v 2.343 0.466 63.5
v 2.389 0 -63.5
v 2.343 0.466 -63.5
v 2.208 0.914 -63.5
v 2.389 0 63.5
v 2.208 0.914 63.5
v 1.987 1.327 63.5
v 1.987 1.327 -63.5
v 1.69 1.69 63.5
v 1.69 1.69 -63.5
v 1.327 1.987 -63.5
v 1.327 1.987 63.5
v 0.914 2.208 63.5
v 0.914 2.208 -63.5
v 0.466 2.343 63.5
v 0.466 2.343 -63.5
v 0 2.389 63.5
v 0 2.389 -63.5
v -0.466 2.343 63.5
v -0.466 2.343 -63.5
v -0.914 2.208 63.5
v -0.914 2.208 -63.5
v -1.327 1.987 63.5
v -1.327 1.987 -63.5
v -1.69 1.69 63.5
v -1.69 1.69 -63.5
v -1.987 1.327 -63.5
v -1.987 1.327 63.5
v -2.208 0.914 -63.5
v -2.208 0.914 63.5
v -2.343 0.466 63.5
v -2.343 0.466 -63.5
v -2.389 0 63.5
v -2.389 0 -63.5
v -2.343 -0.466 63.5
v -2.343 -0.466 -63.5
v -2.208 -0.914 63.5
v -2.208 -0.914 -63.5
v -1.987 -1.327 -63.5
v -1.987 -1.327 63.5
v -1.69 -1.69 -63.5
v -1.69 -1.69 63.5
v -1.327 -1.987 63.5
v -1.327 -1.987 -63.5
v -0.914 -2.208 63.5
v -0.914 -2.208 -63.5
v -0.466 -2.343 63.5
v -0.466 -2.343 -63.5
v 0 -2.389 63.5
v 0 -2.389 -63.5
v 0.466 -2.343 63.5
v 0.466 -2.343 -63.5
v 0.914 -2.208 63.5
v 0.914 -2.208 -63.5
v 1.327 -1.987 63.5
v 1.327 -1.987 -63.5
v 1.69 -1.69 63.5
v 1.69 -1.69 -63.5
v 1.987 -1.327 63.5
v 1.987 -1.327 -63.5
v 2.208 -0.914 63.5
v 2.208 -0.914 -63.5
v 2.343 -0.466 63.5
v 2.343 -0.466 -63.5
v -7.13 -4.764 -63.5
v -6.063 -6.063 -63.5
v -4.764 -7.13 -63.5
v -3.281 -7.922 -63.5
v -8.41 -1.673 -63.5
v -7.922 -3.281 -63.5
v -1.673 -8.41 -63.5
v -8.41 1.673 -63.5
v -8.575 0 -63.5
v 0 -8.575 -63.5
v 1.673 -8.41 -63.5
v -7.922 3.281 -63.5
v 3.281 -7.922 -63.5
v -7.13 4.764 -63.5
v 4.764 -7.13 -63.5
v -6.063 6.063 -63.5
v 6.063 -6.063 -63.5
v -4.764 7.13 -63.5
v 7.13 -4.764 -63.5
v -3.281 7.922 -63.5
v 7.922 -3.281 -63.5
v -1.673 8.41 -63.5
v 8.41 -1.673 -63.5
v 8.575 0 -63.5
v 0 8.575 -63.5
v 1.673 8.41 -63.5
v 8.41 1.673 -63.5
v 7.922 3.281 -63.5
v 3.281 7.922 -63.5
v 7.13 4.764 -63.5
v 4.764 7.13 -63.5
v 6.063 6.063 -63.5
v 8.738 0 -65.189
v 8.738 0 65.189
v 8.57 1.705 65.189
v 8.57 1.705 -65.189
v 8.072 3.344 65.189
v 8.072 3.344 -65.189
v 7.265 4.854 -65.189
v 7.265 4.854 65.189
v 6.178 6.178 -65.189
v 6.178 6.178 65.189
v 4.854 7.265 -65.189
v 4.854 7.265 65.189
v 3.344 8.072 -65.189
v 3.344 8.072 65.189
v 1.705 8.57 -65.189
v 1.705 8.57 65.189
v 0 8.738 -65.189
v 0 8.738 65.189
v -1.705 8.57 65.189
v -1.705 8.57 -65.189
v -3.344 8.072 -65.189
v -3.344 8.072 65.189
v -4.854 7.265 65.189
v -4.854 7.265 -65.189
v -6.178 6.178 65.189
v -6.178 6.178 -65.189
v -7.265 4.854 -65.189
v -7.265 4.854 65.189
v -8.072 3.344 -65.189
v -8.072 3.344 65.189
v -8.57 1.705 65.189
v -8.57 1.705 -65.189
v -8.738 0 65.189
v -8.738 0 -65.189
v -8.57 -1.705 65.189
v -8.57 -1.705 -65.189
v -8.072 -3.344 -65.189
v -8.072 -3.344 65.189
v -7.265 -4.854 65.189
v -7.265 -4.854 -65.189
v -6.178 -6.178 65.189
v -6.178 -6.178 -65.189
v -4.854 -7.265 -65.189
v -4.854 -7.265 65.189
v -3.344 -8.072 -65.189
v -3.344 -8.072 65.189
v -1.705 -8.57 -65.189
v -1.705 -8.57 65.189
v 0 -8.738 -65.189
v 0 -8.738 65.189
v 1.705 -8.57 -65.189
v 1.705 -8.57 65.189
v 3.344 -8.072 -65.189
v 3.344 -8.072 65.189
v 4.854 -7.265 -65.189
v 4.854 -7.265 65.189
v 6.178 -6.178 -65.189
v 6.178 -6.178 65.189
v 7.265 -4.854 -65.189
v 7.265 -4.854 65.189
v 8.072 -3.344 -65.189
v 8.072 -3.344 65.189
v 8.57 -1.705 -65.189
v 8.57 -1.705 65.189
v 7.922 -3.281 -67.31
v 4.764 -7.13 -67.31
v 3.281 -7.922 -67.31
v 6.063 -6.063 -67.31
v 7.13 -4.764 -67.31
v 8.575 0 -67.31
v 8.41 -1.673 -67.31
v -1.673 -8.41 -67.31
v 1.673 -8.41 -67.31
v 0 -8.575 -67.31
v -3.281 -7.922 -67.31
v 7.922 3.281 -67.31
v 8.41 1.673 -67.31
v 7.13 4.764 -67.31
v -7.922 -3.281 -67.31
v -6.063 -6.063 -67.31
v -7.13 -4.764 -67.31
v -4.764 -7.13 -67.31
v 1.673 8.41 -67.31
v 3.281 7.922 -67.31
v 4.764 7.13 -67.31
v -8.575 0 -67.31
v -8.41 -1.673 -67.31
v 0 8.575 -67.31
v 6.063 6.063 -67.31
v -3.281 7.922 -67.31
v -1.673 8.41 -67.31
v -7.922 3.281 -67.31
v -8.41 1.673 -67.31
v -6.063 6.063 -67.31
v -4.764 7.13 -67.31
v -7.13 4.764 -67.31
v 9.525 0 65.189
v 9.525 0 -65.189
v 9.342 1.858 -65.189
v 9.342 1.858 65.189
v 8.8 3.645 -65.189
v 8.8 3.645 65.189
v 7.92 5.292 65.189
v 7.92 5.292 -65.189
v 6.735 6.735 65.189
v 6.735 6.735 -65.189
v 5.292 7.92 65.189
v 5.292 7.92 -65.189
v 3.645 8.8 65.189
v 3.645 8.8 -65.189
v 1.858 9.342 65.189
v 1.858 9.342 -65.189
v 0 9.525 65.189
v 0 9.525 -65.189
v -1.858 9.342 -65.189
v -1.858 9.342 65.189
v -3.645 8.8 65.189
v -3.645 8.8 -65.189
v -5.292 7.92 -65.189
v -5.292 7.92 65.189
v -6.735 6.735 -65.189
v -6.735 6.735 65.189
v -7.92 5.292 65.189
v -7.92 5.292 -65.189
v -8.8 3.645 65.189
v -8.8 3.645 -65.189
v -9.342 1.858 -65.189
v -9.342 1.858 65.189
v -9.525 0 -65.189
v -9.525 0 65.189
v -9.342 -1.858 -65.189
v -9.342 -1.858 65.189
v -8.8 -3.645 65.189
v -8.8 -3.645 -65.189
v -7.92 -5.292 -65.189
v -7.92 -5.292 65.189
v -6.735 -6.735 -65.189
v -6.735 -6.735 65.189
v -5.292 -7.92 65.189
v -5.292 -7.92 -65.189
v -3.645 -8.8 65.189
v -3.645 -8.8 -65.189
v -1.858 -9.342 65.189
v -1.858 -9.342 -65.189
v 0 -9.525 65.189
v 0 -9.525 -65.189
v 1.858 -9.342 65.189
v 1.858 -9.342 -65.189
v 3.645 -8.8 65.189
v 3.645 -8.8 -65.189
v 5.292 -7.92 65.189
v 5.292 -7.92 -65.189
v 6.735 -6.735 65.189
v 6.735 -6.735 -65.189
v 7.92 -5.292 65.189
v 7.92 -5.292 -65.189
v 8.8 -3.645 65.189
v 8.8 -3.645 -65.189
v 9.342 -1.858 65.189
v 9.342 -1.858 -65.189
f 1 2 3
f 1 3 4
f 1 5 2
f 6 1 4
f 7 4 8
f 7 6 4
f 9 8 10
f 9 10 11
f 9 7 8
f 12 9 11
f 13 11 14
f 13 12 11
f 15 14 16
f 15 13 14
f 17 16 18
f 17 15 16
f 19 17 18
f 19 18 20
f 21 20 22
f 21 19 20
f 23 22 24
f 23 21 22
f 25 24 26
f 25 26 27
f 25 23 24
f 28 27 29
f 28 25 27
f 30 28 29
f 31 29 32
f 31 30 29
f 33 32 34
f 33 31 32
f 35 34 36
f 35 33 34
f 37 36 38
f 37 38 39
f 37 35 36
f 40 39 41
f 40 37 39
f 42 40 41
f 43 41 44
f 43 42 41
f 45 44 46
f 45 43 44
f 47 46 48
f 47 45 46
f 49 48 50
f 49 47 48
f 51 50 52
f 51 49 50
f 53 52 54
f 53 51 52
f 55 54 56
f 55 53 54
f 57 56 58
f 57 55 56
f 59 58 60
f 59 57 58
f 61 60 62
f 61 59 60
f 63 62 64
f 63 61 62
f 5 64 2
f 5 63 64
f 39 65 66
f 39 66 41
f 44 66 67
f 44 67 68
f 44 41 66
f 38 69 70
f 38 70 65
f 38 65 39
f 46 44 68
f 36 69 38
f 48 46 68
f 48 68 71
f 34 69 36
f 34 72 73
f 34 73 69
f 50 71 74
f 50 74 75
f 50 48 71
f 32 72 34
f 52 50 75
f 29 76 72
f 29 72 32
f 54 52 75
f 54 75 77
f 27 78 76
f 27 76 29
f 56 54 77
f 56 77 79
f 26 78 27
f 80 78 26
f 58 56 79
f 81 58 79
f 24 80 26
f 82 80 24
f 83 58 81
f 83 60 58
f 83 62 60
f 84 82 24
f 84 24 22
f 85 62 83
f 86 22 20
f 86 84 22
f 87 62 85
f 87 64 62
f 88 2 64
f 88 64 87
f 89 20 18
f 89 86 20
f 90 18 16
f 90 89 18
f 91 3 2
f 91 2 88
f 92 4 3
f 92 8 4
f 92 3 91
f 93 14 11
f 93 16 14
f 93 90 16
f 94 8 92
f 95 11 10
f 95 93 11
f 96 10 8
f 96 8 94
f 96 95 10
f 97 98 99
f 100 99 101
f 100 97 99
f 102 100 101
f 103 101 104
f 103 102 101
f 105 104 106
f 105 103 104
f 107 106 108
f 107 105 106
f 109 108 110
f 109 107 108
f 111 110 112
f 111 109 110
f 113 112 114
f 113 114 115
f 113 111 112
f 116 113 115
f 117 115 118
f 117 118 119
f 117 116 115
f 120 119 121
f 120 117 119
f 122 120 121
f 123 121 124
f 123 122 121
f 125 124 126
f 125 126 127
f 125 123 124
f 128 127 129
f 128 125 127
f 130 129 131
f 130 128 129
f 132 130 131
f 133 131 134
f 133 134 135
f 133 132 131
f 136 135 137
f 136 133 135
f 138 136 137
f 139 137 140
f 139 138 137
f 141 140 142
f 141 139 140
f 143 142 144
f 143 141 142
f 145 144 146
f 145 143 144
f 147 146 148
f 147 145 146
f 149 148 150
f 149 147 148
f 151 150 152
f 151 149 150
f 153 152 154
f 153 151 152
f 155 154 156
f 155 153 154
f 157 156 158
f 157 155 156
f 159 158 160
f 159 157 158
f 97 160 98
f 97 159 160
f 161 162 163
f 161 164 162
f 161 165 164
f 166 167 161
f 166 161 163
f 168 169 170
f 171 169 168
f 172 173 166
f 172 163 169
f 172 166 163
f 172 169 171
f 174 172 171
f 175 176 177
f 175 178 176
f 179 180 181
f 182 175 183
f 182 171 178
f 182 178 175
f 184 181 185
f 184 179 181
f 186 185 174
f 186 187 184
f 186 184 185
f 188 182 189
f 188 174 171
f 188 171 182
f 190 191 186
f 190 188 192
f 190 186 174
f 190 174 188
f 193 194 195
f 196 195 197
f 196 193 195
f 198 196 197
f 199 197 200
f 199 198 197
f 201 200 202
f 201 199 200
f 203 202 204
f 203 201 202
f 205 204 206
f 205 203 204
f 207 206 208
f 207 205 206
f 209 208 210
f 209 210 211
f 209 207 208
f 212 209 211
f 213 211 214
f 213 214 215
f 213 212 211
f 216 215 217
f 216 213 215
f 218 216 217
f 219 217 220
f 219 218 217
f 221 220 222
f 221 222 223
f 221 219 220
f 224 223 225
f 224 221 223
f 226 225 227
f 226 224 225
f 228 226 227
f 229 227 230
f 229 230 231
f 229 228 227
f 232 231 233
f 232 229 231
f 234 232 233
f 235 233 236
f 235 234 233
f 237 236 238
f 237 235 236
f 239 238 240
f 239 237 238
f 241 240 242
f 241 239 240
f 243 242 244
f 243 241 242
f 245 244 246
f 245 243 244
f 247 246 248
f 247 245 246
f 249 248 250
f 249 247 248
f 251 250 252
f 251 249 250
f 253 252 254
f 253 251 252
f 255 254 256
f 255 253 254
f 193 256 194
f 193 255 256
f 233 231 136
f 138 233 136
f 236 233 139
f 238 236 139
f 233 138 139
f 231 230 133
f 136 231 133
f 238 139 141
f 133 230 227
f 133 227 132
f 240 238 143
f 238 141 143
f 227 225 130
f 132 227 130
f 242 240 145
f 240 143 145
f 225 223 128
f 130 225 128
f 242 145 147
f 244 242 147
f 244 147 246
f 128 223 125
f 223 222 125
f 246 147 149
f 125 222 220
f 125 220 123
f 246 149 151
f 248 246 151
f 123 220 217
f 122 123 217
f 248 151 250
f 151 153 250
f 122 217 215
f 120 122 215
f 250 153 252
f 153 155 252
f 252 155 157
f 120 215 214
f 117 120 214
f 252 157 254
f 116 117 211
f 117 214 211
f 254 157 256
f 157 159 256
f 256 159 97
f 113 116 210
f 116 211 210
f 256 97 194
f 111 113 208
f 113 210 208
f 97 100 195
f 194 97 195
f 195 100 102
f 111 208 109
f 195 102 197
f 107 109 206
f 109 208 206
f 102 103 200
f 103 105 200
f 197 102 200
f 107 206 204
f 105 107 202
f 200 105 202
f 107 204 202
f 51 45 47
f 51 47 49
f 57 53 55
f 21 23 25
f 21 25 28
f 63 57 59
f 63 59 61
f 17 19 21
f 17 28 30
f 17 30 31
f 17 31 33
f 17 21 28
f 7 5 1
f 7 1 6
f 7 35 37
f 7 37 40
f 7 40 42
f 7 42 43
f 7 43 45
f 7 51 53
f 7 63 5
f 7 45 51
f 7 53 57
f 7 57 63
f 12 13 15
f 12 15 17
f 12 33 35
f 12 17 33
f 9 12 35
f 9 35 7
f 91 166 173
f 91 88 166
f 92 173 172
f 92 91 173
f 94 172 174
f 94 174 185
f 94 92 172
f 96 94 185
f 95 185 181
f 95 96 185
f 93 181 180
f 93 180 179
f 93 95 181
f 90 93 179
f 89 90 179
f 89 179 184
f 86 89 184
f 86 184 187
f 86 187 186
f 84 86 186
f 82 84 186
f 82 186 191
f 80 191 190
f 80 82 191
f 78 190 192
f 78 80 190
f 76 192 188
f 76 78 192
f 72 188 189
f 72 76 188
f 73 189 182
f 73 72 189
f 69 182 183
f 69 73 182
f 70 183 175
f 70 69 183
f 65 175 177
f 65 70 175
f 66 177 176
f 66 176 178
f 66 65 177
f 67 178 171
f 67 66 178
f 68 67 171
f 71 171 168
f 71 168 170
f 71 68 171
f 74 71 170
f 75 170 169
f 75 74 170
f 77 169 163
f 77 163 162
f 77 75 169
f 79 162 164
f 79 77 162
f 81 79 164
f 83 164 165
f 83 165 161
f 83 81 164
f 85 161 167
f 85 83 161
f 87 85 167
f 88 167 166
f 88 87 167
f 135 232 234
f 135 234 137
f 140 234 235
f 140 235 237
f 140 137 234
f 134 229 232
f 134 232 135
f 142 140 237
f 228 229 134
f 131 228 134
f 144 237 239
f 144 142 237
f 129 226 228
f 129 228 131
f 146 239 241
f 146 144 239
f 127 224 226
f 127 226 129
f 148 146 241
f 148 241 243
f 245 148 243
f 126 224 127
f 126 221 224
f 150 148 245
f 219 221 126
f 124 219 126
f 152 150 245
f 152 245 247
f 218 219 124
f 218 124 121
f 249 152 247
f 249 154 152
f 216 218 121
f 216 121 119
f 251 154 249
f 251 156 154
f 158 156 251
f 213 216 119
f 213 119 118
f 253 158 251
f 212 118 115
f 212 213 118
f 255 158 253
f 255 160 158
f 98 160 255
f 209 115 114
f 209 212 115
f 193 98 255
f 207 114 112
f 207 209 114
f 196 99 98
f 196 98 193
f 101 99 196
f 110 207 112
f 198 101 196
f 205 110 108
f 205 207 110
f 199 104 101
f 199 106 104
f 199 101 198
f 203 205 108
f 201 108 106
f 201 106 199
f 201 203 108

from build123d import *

# Parameters (mm, degrees)
F0_R     = 9.525
F0_R_2   = 8.7376
F1_DEPTH = 65.1891


with BuildPart() as f1:
    # F0 (on Top) → F1 (new body, symmetric)
    with BuildSketch(Plane.XY):
        Circle(F0_R)
        Circle(F0_R_2, mode=Mode.SUBTRACT)
    extrude(amount=F1_DEPTH, both=True)


with BuildPart() as f3:
    # F2 (on Front) → F3 (revolve)
    with BuildSketch(Plane.XZ):
        Polygon((0, 63.5), (0, -67.31), (8.574672, -67.31), (8.574672, -63.5), (2.389388, -63.5), (2.389388, 63.5), align=None)
    revolve(axis=Axis((0, 0, -1.905), (0, 0, 1)))


solid = Compound([f1.part, f3.part])
